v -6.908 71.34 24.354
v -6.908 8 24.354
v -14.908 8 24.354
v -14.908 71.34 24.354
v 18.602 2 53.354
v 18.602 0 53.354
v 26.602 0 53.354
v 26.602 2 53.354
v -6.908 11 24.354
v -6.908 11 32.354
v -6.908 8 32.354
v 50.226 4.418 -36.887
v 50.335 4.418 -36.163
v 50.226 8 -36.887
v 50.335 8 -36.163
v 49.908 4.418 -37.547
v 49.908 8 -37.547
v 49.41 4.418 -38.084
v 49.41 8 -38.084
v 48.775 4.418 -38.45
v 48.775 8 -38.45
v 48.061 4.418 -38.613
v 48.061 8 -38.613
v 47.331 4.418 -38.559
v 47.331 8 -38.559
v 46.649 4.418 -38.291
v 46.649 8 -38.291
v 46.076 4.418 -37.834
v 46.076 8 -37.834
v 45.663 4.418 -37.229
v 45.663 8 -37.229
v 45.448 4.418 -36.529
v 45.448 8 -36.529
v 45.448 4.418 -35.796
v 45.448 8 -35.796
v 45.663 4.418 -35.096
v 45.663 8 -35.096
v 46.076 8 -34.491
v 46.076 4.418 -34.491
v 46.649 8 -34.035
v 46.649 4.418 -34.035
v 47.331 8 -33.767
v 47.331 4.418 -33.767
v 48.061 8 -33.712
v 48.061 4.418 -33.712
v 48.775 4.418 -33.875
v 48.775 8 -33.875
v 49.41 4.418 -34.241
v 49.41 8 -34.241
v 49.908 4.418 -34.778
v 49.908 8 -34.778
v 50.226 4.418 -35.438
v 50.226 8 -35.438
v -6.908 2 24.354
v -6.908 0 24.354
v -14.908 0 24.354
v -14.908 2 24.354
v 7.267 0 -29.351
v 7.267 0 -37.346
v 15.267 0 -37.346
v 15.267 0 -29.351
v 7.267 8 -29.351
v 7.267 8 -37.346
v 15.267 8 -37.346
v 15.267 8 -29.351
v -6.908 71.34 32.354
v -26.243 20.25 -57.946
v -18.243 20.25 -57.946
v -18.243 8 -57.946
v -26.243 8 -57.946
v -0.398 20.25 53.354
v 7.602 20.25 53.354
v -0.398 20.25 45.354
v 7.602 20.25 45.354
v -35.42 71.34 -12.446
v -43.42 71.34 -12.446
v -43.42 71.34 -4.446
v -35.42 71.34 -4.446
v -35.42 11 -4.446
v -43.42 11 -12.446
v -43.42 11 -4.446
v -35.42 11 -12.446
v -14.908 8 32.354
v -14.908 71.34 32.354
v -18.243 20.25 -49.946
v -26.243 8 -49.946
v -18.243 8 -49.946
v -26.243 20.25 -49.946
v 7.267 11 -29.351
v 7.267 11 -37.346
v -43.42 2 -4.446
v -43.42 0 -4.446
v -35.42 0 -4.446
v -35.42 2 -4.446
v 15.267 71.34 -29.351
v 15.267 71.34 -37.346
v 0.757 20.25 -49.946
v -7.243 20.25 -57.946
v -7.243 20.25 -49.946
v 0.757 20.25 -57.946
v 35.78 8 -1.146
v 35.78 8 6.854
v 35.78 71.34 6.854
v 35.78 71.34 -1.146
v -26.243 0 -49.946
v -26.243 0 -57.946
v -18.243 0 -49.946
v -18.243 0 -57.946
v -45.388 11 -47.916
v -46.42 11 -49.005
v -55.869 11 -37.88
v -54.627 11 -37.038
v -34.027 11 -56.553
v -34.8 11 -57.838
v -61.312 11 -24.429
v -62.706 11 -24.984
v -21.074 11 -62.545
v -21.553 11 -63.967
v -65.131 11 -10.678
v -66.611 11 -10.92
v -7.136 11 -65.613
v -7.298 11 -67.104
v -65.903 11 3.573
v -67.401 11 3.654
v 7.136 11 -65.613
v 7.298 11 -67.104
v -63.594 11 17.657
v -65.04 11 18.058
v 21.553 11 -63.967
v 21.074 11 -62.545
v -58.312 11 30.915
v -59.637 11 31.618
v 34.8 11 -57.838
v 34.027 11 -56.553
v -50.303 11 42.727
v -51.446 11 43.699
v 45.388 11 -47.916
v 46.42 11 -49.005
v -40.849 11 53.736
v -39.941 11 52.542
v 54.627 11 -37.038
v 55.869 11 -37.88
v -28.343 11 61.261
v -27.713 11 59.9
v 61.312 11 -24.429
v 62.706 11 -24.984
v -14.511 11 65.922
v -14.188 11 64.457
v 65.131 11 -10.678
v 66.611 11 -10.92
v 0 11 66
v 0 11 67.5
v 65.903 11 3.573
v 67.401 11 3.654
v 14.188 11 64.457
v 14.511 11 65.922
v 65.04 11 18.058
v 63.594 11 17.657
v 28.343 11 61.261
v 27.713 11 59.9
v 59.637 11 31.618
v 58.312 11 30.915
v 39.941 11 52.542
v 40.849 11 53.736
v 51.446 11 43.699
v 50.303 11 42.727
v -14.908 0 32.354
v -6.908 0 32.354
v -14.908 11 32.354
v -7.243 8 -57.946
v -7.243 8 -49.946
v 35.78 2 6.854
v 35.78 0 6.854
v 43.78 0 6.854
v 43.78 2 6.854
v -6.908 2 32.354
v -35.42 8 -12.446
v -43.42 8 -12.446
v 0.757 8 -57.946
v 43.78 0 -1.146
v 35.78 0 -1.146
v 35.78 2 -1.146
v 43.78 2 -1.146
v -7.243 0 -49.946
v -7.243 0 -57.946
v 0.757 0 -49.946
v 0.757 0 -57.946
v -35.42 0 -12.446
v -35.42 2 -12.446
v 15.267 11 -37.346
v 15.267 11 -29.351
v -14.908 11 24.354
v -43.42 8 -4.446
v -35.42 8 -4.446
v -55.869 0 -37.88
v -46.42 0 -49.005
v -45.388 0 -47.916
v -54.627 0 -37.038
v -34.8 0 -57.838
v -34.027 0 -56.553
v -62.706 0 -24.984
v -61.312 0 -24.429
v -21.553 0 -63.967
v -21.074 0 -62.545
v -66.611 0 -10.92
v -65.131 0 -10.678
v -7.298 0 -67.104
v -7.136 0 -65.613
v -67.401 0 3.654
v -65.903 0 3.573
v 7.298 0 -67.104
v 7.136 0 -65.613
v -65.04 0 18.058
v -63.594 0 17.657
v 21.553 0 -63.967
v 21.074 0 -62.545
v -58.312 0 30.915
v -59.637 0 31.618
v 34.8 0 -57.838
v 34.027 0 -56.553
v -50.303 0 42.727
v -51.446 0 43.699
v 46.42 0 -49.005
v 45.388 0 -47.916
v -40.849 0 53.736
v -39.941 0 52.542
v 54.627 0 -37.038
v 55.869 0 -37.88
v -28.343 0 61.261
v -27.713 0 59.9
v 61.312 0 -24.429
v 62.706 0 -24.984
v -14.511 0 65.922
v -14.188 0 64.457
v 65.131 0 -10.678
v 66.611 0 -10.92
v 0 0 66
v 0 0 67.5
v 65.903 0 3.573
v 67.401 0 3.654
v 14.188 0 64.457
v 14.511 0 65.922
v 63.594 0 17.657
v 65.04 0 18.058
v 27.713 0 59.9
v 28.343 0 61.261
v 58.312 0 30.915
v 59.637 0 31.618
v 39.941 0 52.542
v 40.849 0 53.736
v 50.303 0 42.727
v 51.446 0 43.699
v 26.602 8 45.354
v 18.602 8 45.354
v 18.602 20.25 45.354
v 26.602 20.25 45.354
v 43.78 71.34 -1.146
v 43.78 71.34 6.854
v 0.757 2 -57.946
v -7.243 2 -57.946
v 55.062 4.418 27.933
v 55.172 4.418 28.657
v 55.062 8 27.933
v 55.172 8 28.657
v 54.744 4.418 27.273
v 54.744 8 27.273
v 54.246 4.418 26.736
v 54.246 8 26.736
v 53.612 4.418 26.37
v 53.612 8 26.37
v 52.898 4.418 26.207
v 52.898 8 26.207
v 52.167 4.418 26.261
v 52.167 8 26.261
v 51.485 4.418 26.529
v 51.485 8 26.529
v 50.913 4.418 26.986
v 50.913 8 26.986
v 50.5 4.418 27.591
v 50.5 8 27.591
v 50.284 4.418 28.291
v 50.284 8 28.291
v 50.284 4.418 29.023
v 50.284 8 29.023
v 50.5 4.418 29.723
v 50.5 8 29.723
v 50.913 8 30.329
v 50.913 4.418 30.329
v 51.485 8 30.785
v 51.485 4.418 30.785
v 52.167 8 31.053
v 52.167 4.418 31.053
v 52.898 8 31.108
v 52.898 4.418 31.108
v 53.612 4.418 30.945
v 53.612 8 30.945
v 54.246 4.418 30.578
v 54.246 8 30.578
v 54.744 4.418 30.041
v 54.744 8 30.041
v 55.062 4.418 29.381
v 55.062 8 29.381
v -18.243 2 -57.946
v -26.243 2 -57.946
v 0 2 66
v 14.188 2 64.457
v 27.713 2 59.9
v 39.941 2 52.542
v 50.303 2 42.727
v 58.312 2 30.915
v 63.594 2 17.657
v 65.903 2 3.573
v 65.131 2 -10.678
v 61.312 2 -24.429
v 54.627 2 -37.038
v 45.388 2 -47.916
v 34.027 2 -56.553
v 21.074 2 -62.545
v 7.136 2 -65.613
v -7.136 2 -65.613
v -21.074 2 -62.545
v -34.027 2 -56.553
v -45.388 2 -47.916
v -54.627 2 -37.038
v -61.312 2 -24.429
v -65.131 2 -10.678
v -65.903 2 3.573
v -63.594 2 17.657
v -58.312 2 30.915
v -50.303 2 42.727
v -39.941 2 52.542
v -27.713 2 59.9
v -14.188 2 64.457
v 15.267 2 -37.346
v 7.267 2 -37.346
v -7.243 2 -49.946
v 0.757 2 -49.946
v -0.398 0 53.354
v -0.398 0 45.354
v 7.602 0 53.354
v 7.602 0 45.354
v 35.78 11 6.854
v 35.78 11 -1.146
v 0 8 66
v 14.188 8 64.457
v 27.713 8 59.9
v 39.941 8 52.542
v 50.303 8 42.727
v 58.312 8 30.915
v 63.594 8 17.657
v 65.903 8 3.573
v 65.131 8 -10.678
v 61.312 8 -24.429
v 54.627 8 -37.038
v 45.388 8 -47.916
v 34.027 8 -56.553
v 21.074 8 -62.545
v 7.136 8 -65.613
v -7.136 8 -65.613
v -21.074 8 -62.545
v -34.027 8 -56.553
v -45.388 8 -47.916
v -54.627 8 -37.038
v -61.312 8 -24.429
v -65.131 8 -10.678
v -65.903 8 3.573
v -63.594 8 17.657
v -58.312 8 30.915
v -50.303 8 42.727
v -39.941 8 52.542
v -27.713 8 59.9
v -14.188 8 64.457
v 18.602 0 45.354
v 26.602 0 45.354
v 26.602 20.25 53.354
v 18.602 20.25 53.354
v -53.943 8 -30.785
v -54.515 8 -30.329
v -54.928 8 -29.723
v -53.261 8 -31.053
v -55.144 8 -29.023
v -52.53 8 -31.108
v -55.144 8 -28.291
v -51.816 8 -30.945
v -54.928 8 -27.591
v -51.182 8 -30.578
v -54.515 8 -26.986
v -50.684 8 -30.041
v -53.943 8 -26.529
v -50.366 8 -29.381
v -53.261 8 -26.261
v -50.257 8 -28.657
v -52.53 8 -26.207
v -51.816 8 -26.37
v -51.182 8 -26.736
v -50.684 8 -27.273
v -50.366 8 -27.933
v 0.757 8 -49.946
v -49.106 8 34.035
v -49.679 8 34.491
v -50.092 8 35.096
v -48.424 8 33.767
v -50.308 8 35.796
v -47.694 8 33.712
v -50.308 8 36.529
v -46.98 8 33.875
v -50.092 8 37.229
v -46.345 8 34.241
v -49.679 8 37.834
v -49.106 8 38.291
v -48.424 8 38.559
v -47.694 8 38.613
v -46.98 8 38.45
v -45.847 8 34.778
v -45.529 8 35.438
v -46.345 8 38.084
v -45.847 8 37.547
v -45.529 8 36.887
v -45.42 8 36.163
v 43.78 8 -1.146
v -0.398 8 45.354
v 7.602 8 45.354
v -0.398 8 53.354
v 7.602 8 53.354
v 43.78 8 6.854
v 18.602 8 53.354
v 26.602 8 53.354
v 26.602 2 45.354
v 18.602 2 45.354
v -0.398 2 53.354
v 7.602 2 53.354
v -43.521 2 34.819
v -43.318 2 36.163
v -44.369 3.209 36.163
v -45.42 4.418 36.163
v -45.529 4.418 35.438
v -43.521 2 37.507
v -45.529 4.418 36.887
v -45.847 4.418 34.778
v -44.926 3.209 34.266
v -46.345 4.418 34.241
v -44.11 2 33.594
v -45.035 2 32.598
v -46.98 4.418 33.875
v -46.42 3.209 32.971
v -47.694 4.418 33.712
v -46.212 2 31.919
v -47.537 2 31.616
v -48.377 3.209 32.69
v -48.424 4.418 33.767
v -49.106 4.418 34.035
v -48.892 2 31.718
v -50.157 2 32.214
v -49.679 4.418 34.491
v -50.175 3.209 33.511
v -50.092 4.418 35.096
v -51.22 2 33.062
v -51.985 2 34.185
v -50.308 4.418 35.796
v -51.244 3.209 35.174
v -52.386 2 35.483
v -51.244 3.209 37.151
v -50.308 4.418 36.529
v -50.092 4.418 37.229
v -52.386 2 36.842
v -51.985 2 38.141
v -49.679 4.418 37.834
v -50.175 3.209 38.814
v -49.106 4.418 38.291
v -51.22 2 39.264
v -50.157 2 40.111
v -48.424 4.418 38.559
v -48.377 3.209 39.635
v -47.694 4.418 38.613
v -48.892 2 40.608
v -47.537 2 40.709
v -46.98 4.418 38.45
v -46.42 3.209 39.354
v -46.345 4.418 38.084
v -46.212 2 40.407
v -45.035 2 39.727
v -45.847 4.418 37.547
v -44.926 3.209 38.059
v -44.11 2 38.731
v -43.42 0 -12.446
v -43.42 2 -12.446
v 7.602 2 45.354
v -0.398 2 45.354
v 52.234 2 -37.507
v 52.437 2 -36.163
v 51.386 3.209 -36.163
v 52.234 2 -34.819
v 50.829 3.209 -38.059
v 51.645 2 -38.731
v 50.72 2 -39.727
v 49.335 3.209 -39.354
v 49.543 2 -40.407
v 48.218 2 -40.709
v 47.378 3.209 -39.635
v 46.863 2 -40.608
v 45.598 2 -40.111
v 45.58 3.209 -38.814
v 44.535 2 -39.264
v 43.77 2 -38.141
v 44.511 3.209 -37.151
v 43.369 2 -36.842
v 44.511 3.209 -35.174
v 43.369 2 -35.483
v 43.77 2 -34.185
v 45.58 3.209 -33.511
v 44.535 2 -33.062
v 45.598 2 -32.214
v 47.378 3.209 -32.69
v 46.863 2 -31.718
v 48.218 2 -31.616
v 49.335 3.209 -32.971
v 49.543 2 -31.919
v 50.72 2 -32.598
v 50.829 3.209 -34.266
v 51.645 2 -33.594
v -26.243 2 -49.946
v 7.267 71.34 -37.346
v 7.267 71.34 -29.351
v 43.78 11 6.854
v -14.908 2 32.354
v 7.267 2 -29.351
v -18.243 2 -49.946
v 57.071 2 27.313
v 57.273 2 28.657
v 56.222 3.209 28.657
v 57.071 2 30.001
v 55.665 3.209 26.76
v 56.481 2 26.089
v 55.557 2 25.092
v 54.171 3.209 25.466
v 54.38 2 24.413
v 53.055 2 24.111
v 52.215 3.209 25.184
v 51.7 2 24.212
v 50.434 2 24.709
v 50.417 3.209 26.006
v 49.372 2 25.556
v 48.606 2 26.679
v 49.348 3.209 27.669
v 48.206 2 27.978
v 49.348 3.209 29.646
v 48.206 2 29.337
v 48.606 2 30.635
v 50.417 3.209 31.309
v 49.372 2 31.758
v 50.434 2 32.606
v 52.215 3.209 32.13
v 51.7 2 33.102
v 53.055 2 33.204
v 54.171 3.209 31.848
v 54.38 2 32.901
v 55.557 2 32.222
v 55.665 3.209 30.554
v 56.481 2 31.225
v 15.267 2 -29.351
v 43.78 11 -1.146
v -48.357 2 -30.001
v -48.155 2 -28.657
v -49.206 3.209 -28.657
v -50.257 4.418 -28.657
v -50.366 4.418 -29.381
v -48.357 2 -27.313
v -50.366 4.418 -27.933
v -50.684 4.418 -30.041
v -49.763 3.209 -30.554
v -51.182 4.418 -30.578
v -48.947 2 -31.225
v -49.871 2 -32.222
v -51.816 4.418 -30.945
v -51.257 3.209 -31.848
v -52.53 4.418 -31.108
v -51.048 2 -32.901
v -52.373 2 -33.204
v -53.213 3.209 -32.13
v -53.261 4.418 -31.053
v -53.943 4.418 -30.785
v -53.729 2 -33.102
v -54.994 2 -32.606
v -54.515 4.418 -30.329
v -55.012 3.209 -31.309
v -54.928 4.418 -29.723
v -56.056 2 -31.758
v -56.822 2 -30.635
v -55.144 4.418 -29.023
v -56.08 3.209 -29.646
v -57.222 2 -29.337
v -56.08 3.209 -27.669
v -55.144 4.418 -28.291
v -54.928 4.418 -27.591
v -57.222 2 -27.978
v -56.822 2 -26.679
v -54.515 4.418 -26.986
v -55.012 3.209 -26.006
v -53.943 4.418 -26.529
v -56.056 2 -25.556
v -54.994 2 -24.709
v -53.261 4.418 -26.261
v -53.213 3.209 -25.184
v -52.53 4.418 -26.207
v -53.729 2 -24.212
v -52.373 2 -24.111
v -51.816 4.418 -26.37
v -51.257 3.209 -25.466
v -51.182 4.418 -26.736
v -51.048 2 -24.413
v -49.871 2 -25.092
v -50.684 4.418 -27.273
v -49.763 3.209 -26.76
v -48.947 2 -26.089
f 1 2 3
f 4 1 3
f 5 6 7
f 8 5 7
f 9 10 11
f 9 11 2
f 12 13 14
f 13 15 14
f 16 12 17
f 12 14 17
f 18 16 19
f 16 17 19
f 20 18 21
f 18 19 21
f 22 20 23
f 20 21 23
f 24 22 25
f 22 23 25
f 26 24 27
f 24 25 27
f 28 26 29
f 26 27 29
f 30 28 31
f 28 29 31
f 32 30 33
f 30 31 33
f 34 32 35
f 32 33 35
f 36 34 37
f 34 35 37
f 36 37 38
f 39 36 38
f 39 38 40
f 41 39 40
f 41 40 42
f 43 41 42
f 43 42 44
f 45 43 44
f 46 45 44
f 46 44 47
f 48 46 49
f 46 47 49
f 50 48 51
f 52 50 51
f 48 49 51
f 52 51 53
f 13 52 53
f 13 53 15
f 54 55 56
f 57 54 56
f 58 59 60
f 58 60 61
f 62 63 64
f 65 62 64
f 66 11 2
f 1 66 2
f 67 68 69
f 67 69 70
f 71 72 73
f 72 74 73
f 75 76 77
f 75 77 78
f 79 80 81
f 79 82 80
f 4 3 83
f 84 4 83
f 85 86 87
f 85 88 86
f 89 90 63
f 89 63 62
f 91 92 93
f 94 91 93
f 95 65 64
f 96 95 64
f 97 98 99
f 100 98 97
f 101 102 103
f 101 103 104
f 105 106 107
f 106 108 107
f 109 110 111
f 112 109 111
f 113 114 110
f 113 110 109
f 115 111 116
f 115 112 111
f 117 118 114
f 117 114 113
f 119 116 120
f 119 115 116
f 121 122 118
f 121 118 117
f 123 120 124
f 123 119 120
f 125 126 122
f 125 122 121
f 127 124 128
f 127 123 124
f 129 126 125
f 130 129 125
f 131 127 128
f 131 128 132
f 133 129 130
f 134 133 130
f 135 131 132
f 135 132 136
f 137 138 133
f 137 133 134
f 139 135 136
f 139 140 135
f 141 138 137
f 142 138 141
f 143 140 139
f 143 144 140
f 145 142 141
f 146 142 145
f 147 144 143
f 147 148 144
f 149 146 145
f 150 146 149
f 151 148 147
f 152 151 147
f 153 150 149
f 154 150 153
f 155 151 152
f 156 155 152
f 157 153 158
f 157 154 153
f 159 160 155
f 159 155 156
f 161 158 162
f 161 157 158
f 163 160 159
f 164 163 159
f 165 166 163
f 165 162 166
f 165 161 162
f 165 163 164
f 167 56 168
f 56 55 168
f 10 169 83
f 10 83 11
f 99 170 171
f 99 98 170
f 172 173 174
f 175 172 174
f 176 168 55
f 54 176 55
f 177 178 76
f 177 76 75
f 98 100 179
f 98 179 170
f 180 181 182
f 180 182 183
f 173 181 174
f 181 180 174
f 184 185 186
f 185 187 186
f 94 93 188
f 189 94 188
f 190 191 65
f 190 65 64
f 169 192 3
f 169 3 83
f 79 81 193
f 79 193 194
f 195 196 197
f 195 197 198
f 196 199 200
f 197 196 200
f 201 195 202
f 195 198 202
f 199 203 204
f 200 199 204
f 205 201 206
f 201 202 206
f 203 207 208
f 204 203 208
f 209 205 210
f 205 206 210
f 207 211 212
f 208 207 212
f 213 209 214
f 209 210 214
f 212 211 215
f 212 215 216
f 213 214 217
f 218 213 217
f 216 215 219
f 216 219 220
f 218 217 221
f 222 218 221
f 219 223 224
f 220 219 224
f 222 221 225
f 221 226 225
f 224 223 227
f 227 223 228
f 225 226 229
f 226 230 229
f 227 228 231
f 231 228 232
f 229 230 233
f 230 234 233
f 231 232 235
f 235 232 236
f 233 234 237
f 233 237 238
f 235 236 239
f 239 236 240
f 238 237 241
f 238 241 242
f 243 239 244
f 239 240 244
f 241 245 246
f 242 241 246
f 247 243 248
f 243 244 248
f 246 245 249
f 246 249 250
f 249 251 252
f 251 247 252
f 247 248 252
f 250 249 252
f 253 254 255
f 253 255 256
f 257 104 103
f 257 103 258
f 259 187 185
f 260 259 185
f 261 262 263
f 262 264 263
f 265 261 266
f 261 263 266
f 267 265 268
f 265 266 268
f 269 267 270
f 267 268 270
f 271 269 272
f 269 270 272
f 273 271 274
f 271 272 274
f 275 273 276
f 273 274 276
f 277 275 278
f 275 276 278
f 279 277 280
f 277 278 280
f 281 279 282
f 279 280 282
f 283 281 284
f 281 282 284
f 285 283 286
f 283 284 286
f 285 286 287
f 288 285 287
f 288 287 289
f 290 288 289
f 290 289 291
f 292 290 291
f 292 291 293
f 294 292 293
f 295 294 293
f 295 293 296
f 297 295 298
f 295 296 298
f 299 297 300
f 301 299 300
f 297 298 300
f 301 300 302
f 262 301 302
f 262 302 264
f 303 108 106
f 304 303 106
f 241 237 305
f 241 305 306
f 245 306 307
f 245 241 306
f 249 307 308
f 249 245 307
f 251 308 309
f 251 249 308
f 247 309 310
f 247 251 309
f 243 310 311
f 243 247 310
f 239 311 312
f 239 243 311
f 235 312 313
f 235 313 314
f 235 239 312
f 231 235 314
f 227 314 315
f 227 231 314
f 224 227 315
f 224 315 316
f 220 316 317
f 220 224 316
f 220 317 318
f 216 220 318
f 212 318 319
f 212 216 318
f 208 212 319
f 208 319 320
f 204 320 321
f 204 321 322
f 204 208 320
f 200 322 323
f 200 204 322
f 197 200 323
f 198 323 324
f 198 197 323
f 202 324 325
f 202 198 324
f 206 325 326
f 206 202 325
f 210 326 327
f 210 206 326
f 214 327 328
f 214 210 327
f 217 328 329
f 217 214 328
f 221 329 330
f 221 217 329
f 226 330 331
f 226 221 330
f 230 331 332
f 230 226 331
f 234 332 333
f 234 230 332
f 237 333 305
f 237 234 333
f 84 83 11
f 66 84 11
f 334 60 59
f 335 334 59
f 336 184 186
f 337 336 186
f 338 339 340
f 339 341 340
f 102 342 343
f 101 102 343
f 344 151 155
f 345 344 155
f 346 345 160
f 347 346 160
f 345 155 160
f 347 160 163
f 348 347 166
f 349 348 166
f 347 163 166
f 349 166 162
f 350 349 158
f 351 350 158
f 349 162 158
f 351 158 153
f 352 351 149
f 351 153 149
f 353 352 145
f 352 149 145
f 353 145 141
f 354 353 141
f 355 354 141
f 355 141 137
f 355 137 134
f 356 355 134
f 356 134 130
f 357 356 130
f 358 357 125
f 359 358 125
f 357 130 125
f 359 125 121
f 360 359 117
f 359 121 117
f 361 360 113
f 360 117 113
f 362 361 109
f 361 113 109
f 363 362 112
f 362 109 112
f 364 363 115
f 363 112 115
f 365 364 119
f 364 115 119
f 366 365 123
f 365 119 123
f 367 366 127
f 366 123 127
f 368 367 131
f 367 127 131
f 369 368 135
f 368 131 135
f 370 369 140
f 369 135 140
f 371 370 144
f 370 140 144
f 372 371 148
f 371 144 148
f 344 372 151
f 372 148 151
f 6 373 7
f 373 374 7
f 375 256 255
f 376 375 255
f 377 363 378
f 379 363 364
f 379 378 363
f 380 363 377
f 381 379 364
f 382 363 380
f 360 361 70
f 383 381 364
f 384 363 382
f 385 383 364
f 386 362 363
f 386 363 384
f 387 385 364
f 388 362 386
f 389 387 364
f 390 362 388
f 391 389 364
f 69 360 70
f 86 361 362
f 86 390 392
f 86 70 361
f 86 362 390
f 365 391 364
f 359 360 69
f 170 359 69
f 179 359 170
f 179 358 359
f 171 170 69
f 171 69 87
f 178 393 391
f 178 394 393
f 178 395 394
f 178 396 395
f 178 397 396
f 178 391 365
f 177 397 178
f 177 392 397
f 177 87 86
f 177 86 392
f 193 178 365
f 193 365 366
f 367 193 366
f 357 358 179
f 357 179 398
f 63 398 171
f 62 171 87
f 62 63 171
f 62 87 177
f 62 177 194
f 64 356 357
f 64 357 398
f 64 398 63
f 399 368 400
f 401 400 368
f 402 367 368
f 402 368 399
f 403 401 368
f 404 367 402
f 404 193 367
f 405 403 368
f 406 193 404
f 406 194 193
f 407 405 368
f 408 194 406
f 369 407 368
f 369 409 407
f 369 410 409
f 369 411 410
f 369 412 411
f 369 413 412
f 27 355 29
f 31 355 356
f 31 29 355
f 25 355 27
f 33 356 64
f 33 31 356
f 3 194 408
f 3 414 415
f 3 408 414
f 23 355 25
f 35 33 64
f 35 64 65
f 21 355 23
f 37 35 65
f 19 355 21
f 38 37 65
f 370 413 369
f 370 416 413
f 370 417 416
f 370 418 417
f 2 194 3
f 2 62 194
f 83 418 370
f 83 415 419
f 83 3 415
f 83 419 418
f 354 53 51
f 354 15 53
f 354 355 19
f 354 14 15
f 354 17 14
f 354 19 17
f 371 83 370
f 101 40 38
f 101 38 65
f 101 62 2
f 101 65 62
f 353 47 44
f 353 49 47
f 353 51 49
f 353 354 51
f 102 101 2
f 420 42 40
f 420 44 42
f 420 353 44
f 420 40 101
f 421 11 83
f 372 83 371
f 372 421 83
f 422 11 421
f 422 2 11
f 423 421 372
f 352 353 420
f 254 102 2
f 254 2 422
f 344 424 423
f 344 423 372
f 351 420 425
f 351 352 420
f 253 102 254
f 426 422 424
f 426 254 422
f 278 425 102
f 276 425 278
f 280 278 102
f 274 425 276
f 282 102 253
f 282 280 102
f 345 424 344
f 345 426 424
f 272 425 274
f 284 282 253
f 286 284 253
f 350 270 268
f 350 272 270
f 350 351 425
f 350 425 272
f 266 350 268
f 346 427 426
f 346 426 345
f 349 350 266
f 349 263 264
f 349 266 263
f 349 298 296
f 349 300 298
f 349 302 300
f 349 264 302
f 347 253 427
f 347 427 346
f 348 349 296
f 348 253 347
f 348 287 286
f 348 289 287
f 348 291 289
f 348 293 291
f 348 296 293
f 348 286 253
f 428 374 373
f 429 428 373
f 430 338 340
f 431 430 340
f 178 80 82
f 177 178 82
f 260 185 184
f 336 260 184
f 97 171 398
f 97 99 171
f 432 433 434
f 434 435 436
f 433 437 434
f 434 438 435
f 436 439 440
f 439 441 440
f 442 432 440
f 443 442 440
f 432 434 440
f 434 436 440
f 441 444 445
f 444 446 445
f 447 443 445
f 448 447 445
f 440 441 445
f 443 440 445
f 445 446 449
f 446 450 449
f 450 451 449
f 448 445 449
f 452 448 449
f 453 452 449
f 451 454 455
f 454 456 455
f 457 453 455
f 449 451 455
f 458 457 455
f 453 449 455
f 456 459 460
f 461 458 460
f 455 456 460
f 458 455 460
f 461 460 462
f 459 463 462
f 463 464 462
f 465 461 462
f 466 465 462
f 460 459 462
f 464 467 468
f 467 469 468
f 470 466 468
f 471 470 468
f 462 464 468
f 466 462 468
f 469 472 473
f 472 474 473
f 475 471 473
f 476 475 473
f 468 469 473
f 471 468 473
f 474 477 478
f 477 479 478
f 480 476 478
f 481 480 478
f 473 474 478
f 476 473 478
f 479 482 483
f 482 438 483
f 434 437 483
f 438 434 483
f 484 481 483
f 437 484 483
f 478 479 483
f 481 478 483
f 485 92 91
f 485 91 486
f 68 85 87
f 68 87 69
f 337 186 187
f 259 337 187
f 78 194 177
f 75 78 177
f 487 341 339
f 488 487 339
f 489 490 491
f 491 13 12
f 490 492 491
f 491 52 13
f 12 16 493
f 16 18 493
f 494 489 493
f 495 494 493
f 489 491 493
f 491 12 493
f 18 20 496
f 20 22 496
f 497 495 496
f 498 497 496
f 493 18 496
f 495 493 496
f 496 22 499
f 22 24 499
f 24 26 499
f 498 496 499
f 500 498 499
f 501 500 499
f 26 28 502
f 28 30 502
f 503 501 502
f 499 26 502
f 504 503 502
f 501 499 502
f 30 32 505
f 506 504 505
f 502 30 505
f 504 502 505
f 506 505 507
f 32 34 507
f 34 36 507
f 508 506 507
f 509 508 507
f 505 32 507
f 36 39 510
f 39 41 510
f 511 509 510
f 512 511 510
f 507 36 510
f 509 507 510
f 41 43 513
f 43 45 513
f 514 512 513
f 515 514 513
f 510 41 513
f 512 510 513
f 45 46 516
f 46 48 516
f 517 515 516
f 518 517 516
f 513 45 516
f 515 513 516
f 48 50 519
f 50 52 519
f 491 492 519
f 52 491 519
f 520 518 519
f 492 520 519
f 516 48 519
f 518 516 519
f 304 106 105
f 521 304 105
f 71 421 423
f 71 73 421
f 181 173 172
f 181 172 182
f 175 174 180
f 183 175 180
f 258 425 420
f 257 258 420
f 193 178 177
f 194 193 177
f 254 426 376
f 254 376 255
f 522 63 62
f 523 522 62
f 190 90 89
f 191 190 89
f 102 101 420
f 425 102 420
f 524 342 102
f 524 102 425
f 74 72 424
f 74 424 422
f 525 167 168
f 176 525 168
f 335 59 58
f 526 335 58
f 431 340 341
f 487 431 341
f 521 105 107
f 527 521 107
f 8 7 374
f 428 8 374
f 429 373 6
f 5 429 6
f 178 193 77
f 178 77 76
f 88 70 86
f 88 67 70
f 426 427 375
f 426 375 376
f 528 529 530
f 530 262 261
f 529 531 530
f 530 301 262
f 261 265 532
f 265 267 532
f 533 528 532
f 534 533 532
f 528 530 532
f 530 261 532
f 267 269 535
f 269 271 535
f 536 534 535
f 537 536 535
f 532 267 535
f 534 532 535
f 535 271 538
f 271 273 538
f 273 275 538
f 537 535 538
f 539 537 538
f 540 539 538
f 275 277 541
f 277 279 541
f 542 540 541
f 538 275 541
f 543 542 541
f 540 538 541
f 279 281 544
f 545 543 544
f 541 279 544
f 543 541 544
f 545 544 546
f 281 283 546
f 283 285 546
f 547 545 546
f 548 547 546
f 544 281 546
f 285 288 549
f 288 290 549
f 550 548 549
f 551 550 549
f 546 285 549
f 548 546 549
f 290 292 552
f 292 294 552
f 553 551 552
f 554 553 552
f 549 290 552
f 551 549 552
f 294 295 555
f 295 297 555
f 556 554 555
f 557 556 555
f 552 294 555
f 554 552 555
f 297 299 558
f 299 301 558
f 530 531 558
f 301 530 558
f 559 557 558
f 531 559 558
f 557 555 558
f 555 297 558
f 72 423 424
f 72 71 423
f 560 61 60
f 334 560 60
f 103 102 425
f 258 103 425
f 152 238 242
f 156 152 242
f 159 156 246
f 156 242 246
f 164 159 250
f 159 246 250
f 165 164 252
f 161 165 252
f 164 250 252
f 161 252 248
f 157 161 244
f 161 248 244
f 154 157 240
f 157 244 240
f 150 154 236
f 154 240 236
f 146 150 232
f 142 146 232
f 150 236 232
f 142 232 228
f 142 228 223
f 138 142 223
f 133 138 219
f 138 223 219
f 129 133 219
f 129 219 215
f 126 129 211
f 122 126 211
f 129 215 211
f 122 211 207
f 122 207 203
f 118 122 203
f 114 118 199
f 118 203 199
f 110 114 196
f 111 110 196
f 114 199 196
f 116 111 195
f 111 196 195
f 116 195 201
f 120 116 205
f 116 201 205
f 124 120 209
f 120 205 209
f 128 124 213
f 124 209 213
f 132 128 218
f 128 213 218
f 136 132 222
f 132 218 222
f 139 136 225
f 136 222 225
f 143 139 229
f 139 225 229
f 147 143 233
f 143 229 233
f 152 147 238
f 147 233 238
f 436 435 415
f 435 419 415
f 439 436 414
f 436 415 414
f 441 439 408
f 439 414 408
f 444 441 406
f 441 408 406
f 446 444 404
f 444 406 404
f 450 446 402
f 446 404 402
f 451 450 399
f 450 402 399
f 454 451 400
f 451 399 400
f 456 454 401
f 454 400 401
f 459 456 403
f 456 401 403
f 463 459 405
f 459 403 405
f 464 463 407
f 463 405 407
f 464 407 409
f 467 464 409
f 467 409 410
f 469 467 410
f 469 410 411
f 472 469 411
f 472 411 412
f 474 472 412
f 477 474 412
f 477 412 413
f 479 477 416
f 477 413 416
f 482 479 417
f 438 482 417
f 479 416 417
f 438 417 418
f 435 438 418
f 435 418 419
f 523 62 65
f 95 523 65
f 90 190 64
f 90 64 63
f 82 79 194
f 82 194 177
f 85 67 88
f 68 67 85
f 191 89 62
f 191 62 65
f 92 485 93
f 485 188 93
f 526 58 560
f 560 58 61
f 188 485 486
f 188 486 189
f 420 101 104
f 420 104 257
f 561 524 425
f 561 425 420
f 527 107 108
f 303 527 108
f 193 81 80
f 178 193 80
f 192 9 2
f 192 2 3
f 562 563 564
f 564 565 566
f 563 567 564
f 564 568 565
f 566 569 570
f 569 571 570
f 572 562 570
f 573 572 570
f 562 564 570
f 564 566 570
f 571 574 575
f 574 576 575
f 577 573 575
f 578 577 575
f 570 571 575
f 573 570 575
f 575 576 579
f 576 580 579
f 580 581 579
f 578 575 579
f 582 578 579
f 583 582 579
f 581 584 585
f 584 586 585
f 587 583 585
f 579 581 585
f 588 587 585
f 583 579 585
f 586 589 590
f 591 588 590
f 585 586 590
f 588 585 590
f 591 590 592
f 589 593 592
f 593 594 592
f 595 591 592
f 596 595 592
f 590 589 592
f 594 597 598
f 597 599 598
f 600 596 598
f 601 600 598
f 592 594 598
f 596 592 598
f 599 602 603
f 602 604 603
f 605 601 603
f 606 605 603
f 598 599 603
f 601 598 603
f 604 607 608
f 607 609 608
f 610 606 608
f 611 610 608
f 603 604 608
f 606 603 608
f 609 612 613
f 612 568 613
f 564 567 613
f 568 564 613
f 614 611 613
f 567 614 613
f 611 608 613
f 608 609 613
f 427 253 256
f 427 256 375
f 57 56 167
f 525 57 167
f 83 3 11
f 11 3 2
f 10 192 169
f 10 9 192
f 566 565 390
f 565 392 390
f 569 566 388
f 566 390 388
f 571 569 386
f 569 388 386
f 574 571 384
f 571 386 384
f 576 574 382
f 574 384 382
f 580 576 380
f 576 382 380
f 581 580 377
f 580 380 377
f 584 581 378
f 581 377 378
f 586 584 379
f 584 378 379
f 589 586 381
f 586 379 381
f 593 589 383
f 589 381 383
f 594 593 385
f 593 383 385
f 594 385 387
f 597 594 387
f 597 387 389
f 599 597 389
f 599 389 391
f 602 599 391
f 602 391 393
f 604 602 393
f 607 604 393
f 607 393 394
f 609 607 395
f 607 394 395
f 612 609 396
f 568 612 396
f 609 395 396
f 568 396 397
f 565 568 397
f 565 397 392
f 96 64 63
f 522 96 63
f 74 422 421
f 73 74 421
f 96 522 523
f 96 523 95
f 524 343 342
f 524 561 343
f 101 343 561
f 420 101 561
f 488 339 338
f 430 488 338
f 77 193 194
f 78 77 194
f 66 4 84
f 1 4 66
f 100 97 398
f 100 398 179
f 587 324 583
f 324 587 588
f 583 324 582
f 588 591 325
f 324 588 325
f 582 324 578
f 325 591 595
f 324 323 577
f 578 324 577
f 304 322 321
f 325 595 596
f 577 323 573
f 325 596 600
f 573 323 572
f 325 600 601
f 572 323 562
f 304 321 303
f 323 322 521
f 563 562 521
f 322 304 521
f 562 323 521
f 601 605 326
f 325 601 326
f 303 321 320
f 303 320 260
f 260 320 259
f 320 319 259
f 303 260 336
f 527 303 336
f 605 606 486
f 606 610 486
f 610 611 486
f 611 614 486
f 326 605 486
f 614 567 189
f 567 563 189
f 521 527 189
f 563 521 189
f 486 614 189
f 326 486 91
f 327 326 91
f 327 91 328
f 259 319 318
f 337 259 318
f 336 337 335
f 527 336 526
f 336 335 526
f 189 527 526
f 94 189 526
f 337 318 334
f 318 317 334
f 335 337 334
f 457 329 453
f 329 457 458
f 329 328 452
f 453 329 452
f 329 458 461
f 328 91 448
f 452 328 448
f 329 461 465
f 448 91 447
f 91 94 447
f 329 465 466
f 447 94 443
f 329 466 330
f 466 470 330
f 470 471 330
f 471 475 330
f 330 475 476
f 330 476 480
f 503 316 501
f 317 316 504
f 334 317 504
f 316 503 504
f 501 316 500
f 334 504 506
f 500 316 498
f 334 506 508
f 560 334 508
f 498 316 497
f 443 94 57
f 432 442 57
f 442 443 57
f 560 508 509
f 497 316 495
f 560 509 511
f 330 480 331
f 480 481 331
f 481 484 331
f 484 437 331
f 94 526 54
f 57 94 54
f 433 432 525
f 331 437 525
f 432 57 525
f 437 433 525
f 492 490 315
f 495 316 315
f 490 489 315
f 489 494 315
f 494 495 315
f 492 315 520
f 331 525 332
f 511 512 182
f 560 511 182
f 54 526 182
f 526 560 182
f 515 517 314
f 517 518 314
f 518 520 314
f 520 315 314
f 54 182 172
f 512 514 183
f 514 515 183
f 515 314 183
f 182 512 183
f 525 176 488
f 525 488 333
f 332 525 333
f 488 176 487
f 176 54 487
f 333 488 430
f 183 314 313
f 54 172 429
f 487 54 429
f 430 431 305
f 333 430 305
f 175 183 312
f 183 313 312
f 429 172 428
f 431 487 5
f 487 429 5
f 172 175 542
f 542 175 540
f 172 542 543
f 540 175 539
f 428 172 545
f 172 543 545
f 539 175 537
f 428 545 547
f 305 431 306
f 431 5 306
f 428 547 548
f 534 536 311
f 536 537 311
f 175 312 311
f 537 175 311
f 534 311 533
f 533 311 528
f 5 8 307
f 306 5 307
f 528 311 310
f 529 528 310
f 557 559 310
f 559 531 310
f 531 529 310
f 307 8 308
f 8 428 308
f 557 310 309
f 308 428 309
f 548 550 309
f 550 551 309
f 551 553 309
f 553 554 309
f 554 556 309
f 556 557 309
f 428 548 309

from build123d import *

# Parameters (mm, degrees)
SKETCH1_R                                         = 67.5
BOSS_EXTRUDE1_DEPTH                               = 11
SKETCH2_R                                         = 66
SKETCH2_W                                         = 8
SKETCH2_H                                         = 8
CUT_EXTRUDE1_DEPTH                                = 3
CUT_EXTRUDE2_START                                = -11
SKETCH2_2_R                                       = 66
SKETCH2_2_W                                       = 8
SKETCH2_2_H                                       = 8
CUT_EXTRUDE2_DEPTH                                = 2
CSK_FOR_8_FLAT_HEAD_SOCKET_CAP_SCREW1_D           = 4.9149
CSK_FOR_8_FLAT_HEAD_SOCKET_CAP_SCREW1_CSINK_D     = 9.1186
CSK_FOR_8_FLAT_HEAD_SOCKET_CAP_SCREW1_CSINK_ANGLE = 82
SKETCH11_W                                        = 8
SKETCH11_H                                        = 8
BOSS_EXTRUDE4_DEPTH                               = 63.34
BOSS_EXTRUDE4_2_DEPTH                             = 63.34
BOSS_EXTRUDE4_3_DEPTH                             = 63.34
BOSS_EXTRUDE4_4_DEPTH                             = 63.34
BOSS_EXTRUDE5_DEPTH                               = 12.25


with BuildPart() as part:
    # Sketch1 → Boss-Extrude1 (new body)
    with BuildSketch(Plane(origin=(0, 0, 0), x_dir=(1, 0, 0), z_dir=(0, 1, 0))):
        with Locations(Location((0, 0, 0), (0, 0, 270))):
            Circle(SKETCH1_R)
    extrude(amount=BOSS_EXTRUDE1_DEPTH)

    # Sketch2 → Cut-Extrude1 (cut)
    with BuildSketch(Plane(origin=(0, 11, 0), x_dir=(1, 0, 0), z_dir=(0, 1, 0))):
        with Locations(Location((0, 0, 0), (0, 0, 270))):
            Circle(SKETCH2_R)
        with Locations((-39.420428007, 8.44578543)):
            Rectangle(SKETCH2_W, SKETCH2_H, mode=Mode.SUBTRACT)
        Polygon((-26.242928007, 49.945707301), (-18.242928007, 49.945723937), (-18.242928007, 57.945723937), (-26.242928007, 57.945707301), align=None, mode=Mode.SUBTRACT)
        Polygon((-7.242928007, 49.945746812), (0.757071993, 49.945763449), (0.757071993, 57.945763449), (-7.242928007, 57.945746812), align=None, mode=Mode.SUBTRACT)
        Polygon((7.267071993, 29.351303866), (15.26708835, 29.351303866), (15.267071993, 37.345889008), (7.267071993, 37.34587264), align=None, mode=Mode.SUBTRACT)
        with Locations((39.779571993, -2.85421457)):
            Rectangle(SKETCH2_W, SKETCH2_H, mode=Mode.SUBTRACT)
        Polygon((18.602071993, -53.354153078), (26.602071993, -53.354136441), (26.602071993, -45.354136441), (18.602071993, -45.354153078), align=None, mode=Mode.SUBTRACT)
        Polygon((-0.397928007, -53.354192589), (7.602071993, -53.354175953), (7.602071993, -45.354175953), (-0.397928007, -45.354192589), align=None, mode=Mode.SUBTRACT)
        Polygon((-14.907928007, -32.354318149), (-6.907928007, -32.354301781), (-6.907928007, -24.354301781), (-14.907928007, -24.354318149), align=None, mode=Mode.SUBTRACT)
    extrude(amount=-CUT_EXTRUDE1_DEPTH, mode=Mode.SUBTRACT)

    # Sketch2<2> → Cut-Extrude2 (cut)
    with BuildSketch(Plane(origin=(0, 11, 0), x_dir=(1, 0, 0), z_dir=(0, 1, 0)).offset(CUT_EXTRUDE2_START)):
        with Locations(Location((0, 0, 0), (0, 0, 270))):
            Circle(SKETCH2_2_R)
        with Locations((-39.420428007, 8.44578543)):
            Rectangle(SKETCH2_2_W, SKETCH2_2_H, mode=Mode.SUBTRACT)
        Polygon((-26.242928007, 49.945707301), (-18.242928007, 49.945723937), (-18.242928007, 57.945723937), (-26.242928007, 57.945707301), align=None, mode=Mode.SUBTRACT)
        Polygon((-7.242928007, 49.945746812), (0.757071993, 49.945763449), (0.757071993, 57.945763449), (-7.242928007, 57.945746812), align=None, mode=Mode.SUBTRACT)
        Polygon((7.267071993, 29.351303866), (15.26708835, 29.351303866), (15.267071993, 37.345889008), (7.267071993, 37.34587264), align=None, mode=Mode.SUBTRACT)
        with Locations((39.779571993, -2.85421457)):
            Rectangle(SKETCH2_2_W, SKETCH2_2_H, mode=Mode.SUBTRACT)
        Polygon((18.602071993, -53.354153078), (26.602071993, -53.354136441), (26.602071993, -45.354136441), (18.602071993, -45.354153078), align=None, mode=Mode.SUBTRACT)
        Polygon((-0.397928007, -53.354192589), (7.602071993, -53.354175953), (7.602071993, -45.354175953), (-0.397928007, -45.354192589), align=None, mode=Mode.SUBTRACT)
        Polygon((-14.907928007, -32.354318149), (-6.907928007, -32.354301781), (-6.907928007, -24.354301781), (-14.907928007, -24.354318149), align=None, mode=Mode.SUBTRACT)
    extrude(amount=CUT_EXTRUDE2_DEPTH, mode=Mode.SUBTRACT)

    # CSK for #8 Flat Head Socket Cap Screw1 (through all)
    with Locations(Plane(origin=(0, 2, 0), x_dir=(-1, 0, 0), z_dir=(0, -1, 0))):
        with Locations((52.71405081, 28.657090698), (-47.87752691, 36.162721371), (-52.71405081, -28.657090698), (47.87752691, -36.162721371)):
            CounterSinkHole(CSK_FOR_8_FLAT_HEAD_SOCKET_CAP_SCREW1_D / 2, CSK_FOR_8_FLAT_HEAD_SOCKET_CAP_SCREW1_CSINK_D / 2, counter_sink_angle=CSK_FOR_8_FLAT_HEAD_SOCKET_CAP_SCREW1_CSINK_ANGLE)

    # Sketch12 → Boss-Extrude5 (add)
    with BuildSketch(Plane(origin=(0, 8, 0), x_dir=(1, 0, 0), z_dir=(0, 1, 0))):
        Polygon((18.602071993, -53.354153078), (18.602071993, -45.354153078), (26.602071993, -45.354136441), (26.602071993, -53.354136441), align=None)
        Polygon((7.602071993, -53.354175953), (-0.397928007, -53.354192589), (-0.397928007, -45.354192589), (7.602071993, -45.354175953), align=None)
        Polygon((0.757071993, 57.945763449), (-7.242928007, 57.945746812), (-7.242928007, 49.945746812), (0.757071993, 49.945763449), align=None)
        Polygon((-18.242928007, 57.945723937), (-26.242928007, 57.945707301), (-26.242928007, 49.945707301), (-18.242928007, 49.945723937), align=None)
    extrude(amount=BOSS_EXTRUDE5_DEPTH)


with BuildPart() as body_2:
    # Sketch11 → Boss-Extrude4 (new body)
    with BuildSketch(Plane(origin=(0, 8, 0), x_dir=(1, 0, 0), z_dir=(0, 1, 0))):
        with Locations((-39.420428007, 8.44578543)):
            Rectangle(SKETCH11_W, SKETCH11_H)
    extrude(amount=BOSS_EXTRUDE4_DEPTH)


with BuildPart() as body_3:
    # Sketch11 → Boss-Extrude4 2 (new body)
    with BuildSketch(Plane(origin=(0, 8, 0), x_dir=(1, 0, 0), z_dir=(0, 1, 0))):
        Polygon((7.267071993, 37.34587264), (7.267071993, 29.351303866), (15.26708835, 29.351303866), (15.267071993, 37.345889008), align=None)
    extrude(amount=BOSS_EXTRUDE4_2_DEPTH)


with BuildPart() as body_4:
    # Sketch11 → Boss-Extrude4 3 (new body)
    with BuildSketch(Plane(origin=(0, 8, 0), x_dir=(1, 0, 0), z_dir=(0, 1, 0))):
        with Locations((39.779571993, -2.85421457)):
            Rectangle(SKETCH11_W, SKETCH11_H)
    extrude(amount=BOSS_EXTRUDE4_3_DEPTH)


with BuildPart() as body_5:
    # Sketch11 → Boss-Extrude4 4 (new body)
    with BuildSketch(Plane(origin=(0, 8, 0), x_dir=(1, 0, 0), z_dir=(0, 1, 0))):
        Polygon((-14.907928007, -24.354318149), (-14.907928007, -32.354318149), (-6.907928007, -32.354301781), (-6.907928007, -24.354301781), align=None)
    extrude(amount=BOSS_EXTRUDE4_4_DEPTH)


solid = Compound([part.part, body_2.part, body_3.part, body_4.part, body_5.part])
